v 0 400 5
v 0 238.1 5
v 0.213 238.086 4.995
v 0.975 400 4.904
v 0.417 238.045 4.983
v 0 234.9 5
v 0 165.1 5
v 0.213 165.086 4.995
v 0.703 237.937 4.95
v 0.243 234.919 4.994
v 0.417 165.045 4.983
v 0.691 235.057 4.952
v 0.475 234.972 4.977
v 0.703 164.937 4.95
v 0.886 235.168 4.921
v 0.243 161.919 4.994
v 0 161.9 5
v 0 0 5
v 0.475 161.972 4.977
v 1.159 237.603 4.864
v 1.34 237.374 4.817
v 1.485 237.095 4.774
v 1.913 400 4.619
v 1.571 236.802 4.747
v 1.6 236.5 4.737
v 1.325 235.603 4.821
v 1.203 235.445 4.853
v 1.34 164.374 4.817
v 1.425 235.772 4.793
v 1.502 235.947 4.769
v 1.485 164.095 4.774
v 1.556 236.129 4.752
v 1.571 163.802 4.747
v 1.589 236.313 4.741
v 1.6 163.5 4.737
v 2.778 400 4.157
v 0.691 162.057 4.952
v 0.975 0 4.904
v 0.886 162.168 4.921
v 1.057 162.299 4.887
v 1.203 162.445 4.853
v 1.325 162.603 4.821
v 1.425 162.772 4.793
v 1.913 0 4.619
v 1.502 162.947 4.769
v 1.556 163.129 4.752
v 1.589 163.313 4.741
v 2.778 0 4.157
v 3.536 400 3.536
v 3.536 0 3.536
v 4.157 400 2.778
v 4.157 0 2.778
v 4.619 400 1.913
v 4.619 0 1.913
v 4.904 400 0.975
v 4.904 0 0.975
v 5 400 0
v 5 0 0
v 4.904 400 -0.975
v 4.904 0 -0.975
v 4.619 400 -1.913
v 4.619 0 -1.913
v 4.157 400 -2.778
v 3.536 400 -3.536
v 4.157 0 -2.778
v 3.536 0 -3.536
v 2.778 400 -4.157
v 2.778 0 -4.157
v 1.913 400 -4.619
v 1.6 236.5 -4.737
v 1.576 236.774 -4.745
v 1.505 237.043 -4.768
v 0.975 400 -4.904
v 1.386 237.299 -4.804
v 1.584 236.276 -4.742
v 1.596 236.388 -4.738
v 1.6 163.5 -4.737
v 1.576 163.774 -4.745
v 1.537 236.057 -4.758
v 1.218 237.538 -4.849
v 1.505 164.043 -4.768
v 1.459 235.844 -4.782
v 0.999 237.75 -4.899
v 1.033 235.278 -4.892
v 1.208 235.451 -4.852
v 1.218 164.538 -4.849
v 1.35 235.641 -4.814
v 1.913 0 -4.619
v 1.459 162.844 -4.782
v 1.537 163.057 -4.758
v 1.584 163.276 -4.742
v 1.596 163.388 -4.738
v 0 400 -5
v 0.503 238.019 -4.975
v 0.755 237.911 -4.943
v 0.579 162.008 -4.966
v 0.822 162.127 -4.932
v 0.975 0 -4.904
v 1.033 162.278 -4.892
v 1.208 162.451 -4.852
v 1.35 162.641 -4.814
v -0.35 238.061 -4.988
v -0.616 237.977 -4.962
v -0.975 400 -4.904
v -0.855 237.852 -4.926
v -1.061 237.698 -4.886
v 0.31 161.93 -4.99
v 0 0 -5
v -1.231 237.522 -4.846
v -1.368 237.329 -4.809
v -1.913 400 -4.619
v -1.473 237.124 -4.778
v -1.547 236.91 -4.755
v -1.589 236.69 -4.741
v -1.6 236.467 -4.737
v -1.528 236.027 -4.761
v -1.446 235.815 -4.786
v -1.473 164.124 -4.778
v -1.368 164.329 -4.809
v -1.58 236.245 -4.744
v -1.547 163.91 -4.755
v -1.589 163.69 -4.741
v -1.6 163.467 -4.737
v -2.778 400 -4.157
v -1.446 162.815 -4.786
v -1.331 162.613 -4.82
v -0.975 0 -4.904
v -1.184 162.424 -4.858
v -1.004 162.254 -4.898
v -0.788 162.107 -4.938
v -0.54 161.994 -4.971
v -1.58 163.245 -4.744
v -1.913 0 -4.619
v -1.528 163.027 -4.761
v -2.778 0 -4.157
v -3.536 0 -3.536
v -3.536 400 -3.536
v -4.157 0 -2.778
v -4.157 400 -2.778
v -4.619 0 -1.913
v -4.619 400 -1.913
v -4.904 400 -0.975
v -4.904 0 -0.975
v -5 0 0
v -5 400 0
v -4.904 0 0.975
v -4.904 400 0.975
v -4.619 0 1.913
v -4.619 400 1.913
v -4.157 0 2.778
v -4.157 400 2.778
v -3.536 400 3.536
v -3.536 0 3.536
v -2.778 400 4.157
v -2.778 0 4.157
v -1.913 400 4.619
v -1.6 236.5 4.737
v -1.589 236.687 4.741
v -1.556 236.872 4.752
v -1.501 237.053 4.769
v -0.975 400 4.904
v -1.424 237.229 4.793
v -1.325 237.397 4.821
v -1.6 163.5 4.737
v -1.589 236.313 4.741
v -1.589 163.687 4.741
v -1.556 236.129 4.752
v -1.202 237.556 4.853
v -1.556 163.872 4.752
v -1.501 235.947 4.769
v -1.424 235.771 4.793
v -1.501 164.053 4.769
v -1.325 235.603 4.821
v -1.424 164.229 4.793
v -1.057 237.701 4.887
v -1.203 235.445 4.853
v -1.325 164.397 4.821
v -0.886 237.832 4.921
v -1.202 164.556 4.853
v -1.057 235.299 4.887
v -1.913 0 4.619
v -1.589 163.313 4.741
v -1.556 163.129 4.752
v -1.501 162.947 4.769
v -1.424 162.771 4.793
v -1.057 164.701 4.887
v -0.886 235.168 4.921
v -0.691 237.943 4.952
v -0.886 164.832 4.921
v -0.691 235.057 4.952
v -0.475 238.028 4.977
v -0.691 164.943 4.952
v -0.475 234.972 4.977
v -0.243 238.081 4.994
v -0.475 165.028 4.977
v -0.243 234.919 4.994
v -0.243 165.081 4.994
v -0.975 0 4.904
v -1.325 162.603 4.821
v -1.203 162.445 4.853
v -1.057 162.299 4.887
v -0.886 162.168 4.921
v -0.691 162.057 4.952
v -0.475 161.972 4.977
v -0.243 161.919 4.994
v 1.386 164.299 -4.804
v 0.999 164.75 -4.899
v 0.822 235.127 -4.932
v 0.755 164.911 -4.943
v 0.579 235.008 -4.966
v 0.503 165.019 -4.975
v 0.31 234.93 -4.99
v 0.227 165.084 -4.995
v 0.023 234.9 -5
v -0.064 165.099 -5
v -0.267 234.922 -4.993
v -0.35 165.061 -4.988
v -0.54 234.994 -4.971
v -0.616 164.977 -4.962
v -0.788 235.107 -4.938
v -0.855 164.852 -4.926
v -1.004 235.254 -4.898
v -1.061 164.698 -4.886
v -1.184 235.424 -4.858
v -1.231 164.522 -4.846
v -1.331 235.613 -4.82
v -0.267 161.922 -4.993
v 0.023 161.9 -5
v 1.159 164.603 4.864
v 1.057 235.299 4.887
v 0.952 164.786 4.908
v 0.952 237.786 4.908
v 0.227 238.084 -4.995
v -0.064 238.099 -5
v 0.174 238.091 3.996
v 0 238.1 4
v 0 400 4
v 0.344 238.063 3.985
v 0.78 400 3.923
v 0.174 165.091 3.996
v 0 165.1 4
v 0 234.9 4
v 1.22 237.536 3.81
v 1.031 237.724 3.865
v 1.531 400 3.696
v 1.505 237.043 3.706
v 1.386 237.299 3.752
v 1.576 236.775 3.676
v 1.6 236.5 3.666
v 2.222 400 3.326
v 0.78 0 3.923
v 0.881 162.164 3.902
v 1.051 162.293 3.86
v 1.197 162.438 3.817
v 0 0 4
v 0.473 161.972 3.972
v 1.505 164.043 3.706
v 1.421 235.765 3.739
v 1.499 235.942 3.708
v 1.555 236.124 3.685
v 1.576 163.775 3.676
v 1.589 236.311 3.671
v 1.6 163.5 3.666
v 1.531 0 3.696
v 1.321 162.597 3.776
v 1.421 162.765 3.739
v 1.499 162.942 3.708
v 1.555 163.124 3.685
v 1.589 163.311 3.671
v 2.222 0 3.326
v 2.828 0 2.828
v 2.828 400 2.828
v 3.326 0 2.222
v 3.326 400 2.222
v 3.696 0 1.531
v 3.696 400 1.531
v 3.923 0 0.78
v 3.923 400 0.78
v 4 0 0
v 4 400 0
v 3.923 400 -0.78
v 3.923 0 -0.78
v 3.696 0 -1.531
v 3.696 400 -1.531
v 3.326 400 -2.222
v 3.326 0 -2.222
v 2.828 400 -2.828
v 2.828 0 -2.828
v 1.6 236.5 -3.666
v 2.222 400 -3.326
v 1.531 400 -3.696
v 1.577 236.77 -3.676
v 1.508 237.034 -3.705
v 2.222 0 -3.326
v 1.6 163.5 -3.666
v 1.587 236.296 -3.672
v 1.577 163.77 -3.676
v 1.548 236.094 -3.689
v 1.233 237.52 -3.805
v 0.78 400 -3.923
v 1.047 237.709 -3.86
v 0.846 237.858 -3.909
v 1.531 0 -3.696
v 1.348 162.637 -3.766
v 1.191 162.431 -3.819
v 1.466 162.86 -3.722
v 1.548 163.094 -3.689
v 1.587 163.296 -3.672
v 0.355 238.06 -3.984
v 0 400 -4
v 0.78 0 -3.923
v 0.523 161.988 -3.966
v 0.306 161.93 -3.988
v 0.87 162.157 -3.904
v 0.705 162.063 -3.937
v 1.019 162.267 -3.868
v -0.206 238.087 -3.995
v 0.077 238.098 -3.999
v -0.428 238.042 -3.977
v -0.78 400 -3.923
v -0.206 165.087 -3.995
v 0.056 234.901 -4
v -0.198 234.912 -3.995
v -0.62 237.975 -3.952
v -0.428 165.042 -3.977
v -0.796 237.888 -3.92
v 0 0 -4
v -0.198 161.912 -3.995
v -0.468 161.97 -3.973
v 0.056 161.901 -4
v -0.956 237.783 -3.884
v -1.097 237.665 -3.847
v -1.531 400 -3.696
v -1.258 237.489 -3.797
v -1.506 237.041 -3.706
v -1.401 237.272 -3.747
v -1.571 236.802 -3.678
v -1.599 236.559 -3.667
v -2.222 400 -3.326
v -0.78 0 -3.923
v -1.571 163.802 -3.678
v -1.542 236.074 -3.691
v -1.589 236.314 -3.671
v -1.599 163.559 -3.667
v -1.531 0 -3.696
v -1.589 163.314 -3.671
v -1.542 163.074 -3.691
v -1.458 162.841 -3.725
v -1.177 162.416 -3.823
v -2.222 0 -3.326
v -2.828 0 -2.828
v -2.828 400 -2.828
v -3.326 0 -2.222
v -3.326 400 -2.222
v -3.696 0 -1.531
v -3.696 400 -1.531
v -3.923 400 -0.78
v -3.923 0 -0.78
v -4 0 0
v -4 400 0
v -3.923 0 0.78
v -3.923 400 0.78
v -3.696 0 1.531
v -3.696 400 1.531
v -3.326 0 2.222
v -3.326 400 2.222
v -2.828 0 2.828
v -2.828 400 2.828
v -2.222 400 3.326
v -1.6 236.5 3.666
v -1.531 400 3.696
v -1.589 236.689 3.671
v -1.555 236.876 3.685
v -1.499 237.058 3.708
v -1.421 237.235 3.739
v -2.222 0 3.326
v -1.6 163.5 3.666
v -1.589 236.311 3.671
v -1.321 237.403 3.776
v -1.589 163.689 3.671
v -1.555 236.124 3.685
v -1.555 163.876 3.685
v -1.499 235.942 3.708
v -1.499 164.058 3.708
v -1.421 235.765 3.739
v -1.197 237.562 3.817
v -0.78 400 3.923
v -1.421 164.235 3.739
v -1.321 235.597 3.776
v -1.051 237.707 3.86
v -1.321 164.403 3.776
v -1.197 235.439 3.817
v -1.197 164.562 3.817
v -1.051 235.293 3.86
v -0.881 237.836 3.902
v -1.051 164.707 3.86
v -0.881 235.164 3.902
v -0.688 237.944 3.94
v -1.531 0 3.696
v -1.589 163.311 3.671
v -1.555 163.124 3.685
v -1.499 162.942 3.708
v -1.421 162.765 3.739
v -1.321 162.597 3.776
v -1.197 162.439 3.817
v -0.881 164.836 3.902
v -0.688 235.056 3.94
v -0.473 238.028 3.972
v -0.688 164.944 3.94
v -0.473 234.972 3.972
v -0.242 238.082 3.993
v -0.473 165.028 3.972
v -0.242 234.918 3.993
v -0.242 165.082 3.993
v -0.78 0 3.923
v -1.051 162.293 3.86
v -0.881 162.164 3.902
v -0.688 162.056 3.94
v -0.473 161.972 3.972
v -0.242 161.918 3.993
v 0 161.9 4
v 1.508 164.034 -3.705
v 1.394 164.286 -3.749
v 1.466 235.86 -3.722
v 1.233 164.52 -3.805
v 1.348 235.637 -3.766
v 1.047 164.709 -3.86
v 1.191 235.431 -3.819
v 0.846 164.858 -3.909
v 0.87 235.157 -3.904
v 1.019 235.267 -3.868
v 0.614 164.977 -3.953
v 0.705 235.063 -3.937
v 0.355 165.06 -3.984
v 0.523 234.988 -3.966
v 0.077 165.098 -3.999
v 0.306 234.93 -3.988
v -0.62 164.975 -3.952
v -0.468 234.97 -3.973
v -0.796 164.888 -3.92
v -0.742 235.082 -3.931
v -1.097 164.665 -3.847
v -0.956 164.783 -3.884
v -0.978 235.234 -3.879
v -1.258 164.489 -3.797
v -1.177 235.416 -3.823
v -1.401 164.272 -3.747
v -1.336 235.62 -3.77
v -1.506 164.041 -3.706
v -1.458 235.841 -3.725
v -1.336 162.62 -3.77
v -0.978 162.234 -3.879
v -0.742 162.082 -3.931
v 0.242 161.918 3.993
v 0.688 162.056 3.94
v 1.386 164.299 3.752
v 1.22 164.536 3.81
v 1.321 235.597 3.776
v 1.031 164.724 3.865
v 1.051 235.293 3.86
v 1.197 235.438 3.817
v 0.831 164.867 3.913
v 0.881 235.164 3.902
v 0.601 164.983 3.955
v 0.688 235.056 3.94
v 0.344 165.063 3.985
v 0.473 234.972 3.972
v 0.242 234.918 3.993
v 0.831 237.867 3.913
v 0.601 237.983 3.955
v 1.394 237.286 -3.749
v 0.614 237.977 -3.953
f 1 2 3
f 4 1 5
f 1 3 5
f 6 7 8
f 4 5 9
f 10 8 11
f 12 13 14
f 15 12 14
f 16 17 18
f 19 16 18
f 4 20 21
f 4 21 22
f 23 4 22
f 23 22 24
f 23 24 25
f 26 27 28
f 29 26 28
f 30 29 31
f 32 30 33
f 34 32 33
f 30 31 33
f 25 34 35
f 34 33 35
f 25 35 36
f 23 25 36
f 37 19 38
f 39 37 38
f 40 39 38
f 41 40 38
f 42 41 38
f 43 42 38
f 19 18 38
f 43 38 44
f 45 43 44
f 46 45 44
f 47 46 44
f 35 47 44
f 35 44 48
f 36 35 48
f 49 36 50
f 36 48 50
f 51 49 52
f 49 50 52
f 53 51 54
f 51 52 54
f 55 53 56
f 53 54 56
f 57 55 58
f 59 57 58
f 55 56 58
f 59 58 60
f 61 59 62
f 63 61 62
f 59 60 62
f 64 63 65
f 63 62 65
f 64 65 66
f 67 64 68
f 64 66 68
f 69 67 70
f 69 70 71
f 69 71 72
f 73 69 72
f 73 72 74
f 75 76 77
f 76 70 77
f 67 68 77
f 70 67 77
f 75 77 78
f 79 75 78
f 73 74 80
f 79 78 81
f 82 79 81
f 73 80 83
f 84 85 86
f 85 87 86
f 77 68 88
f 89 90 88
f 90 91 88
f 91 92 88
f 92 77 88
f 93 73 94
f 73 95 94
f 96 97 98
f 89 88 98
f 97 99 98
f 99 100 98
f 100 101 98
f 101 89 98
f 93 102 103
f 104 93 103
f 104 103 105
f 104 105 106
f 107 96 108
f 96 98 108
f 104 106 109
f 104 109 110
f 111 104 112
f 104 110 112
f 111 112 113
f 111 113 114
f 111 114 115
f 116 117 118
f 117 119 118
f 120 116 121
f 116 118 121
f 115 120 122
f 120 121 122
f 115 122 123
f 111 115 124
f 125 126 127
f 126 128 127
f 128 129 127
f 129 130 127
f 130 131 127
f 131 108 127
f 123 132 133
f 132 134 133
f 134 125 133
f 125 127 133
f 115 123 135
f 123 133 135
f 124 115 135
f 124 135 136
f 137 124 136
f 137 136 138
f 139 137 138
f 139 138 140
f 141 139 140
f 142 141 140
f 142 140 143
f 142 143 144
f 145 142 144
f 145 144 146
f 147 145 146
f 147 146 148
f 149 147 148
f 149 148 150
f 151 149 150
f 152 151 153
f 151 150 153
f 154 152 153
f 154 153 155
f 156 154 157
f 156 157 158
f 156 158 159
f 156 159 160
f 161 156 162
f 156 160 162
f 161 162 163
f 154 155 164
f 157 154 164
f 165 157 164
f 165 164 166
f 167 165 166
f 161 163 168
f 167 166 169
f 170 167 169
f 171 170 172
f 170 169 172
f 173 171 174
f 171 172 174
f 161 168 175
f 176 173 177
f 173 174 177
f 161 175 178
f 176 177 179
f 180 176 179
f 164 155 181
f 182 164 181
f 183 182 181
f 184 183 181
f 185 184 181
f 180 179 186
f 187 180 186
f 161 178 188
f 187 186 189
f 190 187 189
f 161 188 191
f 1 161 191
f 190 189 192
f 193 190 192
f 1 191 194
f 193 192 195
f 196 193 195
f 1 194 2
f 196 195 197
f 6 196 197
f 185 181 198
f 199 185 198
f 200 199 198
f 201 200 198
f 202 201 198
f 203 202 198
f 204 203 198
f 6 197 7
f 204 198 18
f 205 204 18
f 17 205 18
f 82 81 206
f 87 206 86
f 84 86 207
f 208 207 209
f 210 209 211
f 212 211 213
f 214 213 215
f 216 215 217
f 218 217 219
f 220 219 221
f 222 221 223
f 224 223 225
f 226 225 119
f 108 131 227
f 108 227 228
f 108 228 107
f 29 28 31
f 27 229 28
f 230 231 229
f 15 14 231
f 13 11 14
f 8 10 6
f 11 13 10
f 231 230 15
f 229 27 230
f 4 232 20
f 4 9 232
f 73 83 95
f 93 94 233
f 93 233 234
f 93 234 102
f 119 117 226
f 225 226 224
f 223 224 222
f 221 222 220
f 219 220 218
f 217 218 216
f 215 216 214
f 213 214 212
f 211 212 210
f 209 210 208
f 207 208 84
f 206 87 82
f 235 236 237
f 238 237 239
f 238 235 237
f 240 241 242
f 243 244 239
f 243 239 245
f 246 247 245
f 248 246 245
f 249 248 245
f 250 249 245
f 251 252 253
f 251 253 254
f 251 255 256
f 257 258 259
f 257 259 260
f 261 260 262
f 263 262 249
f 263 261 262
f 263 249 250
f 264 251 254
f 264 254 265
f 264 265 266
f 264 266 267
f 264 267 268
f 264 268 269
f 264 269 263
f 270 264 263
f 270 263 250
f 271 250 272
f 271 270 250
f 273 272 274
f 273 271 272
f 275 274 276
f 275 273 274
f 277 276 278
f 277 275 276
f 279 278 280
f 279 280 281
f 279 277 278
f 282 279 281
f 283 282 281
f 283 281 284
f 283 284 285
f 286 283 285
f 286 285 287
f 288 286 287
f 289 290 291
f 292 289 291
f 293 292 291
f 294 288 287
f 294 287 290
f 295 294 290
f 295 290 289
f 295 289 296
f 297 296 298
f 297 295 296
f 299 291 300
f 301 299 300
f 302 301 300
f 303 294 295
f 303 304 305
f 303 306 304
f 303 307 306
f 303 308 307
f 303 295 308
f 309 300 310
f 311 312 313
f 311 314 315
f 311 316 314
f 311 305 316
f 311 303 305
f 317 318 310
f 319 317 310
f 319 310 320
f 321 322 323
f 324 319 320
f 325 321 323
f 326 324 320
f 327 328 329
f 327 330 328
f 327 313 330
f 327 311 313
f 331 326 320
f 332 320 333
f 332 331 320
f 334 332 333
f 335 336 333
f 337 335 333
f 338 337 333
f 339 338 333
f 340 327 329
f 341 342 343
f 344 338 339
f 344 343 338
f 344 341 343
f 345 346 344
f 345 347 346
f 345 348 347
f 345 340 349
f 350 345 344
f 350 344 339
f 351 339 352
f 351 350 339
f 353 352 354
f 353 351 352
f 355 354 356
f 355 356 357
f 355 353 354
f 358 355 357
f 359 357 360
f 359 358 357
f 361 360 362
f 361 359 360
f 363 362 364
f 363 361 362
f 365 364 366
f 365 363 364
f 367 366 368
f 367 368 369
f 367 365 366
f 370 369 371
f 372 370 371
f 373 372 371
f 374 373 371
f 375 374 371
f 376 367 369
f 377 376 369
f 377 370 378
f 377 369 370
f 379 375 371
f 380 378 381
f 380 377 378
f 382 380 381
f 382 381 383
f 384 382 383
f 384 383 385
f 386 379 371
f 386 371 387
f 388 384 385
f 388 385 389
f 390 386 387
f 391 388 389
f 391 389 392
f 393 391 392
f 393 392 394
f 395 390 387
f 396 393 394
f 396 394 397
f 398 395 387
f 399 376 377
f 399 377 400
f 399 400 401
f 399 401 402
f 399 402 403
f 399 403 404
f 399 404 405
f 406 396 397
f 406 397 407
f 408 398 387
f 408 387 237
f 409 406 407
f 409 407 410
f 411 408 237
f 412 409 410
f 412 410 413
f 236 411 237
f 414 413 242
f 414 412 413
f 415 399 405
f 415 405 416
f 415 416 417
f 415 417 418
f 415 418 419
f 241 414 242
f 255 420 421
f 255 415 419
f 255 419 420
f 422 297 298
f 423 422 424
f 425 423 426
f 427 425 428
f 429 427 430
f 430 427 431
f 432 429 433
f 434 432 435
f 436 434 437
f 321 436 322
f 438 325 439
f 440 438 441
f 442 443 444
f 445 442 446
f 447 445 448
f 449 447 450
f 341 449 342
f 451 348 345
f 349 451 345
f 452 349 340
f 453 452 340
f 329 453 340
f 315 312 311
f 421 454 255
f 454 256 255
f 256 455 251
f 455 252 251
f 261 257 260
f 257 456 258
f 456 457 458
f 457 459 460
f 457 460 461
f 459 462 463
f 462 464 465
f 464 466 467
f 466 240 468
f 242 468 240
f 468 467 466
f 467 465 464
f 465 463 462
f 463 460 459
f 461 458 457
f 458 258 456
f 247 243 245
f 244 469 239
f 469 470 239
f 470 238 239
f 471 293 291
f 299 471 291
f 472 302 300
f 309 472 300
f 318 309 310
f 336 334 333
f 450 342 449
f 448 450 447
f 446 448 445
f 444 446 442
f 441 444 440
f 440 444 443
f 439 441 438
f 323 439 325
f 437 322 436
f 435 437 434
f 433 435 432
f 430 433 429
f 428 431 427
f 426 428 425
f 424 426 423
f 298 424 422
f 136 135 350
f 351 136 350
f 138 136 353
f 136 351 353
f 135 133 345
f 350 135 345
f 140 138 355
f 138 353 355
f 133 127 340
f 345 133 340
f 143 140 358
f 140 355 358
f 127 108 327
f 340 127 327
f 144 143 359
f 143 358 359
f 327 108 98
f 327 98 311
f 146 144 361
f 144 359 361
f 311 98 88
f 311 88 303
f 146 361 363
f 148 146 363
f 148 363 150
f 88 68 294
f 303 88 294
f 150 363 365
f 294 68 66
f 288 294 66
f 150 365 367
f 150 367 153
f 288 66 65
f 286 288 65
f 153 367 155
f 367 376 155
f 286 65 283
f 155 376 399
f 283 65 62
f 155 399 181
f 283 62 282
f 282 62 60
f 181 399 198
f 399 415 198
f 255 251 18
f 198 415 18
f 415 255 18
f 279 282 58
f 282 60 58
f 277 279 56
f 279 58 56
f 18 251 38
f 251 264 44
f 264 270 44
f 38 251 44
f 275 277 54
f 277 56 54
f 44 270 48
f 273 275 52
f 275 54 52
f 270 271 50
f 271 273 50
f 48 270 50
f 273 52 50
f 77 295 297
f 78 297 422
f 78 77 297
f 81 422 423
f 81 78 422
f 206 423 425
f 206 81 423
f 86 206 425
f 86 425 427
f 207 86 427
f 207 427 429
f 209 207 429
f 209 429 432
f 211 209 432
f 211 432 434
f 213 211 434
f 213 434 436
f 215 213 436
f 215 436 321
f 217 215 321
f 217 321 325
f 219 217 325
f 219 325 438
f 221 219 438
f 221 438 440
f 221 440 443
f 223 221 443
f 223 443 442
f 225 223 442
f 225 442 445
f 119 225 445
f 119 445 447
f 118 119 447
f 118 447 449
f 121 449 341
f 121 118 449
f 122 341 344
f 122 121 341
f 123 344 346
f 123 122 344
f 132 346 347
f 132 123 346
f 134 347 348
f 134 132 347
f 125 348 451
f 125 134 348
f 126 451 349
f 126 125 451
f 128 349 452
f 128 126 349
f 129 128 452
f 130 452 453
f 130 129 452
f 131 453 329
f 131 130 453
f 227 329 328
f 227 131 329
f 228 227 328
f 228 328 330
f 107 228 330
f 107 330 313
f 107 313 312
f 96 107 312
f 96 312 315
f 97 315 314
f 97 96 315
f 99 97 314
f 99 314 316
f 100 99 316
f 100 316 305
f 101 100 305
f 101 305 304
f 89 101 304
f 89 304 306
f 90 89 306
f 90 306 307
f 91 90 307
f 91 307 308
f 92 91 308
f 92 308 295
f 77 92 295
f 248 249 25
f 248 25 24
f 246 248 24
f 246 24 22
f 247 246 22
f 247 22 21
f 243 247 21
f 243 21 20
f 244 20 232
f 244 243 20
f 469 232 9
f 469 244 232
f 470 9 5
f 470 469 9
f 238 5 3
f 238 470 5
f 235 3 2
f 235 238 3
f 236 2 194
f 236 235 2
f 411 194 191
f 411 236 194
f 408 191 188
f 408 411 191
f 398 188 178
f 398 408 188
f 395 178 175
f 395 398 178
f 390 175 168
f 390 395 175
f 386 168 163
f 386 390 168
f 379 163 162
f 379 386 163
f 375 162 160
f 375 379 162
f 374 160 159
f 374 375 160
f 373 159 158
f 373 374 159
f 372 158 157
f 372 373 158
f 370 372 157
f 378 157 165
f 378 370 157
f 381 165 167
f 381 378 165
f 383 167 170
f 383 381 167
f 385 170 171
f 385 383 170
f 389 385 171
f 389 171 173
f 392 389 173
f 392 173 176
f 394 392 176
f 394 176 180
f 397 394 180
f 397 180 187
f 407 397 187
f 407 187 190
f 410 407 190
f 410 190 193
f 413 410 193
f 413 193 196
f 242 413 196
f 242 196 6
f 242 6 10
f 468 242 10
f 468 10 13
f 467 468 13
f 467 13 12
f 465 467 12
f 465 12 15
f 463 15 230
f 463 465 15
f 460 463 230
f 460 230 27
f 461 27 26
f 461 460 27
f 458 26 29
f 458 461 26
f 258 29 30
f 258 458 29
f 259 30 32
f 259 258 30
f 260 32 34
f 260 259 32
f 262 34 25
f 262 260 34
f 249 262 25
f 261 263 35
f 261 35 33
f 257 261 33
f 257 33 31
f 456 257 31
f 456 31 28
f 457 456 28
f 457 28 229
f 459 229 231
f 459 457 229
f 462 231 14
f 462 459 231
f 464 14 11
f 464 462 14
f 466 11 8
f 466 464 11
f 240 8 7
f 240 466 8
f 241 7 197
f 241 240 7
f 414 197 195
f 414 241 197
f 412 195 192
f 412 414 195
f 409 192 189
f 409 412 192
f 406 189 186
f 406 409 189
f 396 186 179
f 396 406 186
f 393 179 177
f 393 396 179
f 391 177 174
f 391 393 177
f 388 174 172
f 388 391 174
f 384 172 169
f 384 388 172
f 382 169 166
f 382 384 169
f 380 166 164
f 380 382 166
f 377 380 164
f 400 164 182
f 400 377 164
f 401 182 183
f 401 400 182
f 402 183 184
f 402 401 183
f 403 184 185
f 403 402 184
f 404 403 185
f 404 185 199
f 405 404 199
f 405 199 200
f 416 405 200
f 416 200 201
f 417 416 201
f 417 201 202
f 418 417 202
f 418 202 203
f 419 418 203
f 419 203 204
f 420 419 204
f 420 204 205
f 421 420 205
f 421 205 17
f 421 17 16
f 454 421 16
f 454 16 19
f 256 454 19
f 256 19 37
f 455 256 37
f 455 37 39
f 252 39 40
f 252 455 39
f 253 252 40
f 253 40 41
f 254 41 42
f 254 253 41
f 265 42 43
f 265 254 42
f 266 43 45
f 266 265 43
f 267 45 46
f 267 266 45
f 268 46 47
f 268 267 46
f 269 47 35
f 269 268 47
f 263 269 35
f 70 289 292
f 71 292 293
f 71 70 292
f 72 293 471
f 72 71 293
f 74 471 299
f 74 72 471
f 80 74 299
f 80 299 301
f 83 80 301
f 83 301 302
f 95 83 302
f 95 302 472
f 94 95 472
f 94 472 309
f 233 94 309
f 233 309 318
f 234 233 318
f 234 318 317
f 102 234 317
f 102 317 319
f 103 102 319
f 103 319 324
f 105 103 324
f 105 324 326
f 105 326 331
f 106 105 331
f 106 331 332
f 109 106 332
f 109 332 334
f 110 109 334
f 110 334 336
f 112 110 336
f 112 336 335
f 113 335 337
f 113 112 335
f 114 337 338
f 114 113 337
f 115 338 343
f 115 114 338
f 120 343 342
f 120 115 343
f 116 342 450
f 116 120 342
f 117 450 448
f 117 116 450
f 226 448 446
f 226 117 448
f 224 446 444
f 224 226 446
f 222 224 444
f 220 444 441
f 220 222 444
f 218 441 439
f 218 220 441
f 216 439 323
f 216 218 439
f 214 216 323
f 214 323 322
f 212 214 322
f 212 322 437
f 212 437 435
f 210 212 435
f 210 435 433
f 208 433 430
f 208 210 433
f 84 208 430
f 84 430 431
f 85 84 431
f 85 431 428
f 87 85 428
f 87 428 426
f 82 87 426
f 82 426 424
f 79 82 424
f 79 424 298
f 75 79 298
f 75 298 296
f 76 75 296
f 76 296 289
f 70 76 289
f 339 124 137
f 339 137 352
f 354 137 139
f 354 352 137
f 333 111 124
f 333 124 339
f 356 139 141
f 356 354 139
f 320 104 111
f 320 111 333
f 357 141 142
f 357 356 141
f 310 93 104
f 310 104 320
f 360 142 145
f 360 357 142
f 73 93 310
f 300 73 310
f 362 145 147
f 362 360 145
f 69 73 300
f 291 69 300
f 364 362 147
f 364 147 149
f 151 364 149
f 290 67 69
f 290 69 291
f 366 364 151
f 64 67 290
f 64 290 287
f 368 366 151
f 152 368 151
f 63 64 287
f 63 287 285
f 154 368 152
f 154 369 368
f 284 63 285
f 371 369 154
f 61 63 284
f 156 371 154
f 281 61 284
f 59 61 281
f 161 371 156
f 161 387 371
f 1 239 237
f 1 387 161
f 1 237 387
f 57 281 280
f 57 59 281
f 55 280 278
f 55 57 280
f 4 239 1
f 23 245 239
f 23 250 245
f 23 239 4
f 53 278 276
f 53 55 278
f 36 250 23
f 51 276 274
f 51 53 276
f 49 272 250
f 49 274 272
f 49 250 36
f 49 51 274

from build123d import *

# Parameters (mm, degrees)
ESBO_O1_R                  = 5
ESBO_O1_R_2                = 4
RESSALTO_EXTRUS_O1_DEPTH   = 400
CORTE_EXTRUS_O1_DEPTH      = 401.062495118
CORTE_EXTRUS_O1_DEPTH_BACK = 401.062495118
ESBO_O2_R                  = 1.6


with BuildPart() as part:
    # Esboço1 → Ressalto-extrusão1 (new body)
    with BuildSketch(Plane(origin=(0, 0, 0), x_dir=(1, 0, 0), z_dir=(0, 1, 0))):
        with Locations(Location((0, 0, 0), (0, 0, 270))):
            Circle(ESBO_O1_R)
        with Locations(Location((0, 0, 0), (0, 0, 270))):
            Circle(ESBO_O1_R_2, mode=Mode.SUBTRACT)
    extrude(amount=RESSALTO_EXTRUS_O1_DEPTH)

    # Esboço2 → Corte-extrusão1 (cut, two sides: drawn at the far end of the back side and taken through both)
    with BuildSketch(Plane.XY.offset(-CORTE_EXTRUS_O1_DEPTH_BACK)):
        with Locations((0, 236.5)):
            Circle(ESBO_O2_R)
        with Locations((0, 163.5)):
            Circle(ESBO_O2_R)
    extrude(amount=CORTE_EXTRUS_O1_DEPTH + CORTE_EXTRUS_O1_DEPTH_BACK, mode=Mode.SUBTRACT)


solid = part.part
